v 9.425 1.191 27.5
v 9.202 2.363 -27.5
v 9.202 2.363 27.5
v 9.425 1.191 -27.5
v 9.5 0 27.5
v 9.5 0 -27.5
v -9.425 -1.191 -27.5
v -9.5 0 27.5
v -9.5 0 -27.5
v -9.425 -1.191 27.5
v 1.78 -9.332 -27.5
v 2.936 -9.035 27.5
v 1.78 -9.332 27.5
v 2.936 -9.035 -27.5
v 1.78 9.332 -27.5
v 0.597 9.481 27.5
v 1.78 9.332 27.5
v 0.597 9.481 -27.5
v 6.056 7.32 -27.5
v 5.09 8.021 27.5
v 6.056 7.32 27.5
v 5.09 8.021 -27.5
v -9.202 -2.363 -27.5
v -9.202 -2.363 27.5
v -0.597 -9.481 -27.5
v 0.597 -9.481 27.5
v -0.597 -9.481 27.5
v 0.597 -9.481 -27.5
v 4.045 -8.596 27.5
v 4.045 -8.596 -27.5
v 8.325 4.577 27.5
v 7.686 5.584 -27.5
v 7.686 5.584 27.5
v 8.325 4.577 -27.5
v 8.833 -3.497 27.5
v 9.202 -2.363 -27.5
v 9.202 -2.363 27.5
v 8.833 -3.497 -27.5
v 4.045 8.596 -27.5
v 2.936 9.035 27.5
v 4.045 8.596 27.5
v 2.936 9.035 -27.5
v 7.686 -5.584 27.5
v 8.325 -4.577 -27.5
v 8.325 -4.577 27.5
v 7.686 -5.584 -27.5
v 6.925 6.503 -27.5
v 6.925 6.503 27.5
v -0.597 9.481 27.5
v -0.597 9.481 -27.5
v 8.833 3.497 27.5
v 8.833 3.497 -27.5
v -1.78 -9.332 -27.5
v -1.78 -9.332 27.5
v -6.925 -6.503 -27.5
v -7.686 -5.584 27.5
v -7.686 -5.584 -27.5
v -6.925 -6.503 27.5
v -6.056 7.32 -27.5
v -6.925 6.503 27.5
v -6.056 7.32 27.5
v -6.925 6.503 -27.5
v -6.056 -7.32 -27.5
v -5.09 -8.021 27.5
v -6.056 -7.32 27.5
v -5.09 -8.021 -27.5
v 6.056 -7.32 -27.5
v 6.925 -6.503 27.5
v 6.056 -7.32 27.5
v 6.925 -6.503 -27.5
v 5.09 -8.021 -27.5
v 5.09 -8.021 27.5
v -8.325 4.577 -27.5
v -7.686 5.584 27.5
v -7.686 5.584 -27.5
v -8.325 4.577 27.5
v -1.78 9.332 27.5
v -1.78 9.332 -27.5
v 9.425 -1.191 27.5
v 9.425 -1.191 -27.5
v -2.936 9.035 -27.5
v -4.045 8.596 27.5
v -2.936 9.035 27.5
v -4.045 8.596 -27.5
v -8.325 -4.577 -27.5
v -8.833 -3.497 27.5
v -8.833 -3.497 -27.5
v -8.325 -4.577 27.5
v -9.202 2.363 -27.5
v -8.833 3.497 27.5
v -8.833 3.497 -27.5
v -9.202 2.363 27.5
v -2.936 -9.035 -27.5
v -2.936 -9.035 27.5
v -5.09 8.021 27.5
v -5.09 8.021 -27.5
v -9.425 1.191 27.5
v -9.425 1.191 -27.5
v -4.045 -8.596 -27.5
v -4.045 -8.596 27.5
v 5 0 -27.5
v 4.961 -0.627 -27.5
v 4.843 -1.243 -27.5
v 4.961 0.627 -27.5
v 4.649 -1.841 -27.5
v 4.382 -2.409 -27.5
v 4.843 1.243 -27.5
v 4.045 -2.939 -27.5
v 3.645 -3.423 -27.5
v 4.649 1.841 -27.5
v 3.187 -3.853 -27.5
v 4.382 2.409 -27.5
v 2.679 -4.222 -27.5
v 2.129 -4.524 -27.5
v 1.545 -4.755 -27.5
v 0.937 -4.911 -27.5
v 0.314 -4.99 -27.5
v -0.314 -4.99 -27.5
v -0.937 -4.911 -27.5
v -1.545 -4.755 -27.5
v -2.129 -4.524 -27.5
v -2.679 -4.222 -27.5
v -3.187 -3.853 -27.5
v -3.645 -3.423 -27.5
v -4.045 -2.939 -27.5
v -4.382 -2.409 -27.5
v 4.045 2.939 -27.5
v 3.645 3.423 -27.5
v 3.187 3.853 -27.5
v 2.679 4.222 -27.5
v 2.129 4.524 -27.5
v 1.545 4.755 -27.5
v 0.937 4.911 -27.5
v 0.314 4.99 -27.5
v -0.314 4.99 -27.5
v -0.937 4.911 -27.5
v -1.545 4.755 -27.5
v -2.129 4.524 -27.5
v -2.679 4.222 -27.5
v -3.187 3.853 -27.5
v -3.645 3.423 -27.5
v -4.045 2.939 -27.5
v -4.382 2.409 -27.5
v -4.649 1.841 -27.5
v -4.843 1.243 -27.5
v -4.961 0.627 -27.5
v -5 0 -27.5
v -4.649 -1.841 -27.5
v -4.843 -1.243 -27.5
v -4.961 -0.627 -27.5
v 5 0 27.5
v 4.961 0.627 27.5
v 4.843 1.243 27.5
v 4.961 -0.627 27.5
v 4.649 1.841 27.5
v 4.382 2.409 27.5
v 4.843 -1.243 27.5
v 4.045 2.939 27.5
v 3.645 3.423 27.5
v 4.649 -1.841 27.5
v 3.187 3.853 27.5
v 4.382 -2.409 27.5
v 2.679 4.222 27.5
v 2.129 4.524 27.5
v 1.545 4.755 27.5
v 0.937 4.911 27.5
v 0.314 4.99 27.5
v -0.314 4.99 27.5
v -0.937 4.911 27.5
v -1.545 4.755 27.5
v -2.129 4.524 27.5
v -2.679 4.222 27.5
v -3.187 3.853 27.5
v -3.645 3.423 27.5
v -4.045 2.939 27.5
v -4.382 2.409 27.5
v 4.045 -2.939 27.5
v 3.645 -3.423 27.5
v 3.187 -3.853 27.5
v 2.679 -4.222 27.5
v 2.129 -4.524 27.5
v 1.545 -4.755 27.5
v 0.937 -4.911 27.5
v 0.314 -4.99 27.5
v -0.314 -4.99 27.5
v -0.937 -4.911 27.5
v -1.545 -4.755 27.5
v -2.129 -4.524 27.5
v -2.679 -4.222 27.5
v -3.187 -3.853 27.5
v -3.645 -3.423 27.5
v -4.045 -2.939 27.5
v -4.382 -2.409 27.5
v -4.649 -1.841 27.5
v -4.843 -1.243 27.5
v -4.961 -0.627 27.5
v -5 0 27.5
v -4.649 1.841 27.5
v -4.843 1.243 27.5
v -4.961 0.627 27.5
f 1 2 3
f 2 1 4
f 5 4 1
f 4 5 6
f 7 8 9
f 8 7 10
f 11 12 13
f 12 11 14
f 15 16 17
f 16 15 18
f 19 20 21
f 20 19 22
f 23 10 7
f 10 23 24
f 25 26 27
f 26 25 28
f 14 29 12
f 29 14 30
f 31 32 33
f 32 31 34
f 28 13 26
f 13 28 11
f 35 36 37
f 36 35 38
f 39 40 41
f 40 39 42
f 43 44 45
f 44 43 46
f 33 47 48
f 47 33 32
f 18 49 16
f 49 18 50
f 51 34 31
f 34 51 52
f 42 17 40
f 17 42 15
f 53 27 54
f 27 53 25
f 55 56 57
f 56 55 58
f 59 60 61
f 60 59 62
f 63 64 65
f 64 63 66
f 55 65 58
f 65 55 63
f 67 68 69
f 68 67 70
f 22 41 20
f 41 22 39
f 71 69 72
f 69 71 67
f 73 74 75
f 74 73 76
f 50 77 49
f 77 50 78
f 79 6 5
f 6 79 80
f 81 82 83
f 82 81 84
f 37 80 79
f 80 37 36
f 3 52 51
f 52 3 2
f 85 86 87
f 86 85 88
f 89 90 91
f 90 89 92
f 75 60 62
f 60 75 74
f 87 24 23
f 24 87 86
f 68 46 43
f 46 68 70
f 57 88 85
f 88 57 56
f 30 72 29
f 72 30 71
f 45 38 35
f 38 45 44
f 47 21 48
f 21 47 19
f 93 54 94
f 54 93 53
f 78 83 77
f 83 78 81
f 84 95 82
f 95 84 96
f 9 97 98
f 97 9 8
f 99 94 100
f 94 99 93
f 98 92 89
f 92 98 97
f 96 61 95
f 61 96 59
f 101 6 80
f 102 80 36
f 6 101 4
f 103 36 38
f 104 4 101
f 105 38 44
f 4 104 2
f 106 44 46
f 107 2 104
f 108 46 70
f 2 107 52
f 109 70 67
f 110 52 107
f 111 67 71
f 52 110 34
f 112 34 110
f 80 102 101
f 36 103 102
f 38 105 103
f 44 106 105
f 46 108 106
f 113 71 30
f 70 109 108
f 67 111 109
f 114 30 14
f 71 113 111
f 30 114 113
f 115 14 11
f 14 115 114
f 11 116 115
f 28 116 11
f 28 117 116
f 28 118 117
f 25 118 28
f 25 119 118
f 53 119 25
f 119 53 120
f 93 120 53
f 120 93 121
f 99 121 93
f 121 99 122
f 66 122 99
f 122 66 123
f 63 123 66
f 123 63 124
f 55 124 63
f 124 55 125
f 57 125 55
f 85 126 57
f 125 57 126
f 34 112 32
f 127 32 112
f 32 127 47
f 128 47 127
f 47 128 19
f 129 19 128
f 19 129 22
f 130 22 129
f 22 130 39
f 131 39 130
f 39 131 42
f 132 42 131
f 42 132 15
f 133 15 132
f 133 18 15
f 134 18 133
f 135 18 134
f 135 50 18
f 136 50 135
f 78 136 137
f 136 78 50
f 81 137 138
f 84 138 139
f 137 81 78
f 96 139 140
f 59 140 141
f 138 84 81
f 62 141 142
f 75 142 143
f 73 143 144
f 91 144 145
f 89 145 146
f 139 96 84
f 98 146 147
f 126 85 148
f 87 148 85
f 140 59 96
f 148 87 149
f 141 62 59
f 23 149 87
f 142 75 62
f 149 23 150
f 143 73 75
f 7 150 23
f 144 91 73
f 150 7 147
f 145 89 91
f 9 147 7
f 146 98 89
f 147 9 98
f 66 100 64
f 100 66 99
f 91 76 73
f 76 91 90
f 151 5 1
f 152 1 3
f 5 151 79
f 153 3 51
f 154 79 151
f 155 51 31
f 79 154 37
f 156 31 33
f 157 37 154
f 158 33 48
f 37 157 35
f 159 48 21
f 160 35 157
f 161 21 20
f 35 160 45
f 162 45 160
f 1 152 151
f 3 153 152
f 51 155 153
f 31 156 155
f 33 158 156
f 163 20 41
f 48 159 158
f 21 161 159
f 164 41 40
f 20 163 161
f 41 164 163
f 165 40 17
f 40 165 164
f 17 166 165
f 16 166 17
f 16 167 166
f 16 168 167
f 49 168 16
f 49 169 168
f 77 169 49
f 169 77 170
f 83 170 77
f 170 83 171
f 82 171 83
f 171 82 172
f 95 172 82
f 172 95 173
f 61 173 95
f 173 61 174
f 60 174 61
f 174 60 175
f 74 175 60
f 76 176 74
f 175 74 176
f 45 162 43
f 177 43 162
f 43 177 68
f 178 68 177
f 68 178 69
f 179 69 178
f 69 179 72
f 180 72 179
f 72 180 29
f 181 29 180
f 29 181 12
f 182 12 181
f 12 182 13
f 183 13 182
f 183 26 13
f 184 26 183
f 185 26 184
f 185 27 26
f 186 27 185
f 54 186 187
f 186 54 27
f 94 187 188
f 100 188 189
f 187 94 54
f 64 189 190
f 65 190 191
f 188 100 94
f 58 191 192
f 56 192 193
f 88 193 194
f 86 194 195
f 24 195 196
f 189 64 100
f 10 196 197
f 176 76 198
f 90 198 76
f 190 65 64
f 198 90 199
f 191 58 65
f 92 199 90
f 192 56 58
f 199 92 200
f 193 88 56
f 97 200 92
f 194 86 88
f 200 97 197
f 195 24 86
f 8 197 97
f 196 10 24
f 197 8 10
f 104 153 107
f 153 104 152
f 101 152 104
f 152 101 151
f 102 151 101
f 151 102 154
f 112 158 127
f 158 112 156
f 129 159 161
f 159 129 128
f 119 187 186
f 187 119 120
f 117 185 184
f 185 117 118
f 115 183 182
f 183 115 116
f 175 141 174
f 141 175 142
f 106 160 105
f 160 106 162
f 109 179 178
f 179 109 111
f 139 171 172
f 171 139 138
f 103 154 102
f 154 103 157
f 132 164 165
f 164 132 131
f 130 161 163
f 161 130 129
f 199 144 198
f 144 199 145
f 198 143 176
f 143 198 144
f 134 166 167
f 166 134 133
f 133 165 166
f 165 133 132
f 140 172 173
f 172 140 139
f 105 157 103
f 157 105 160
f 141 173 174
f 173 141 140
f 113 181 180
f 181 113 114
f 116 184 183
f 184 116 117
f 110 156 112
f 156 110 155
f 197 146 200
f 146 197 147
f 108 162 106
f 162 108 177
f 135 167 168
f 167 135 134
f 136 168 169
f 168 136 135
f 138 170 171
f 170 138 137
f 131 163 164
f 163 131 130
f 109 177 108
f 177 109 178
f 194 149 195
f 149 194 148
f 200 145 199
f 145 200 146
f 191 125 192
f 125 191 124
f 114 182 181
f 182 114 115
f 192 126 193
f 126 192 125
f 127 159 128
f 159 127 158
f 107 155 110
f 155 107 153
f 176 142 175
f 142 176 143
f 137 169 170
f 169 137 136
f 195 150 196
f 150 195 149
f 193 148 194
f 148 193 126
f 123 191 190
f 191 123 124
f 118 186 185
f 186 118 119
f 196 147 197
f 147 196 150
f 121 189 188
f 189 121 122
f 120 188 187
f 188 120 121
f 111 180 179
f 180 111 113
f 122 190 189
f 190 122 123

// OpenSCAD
$fn = 50;


difference() {
	union() {
		translate(v = [0, 0, -27.5000000000]) {
			cylinder(h = 55, r = 9.5000000000);
		}
	}
	union() {
		translate(v = [0, 0, -100.0000000000]) {
			cylinder(h = 200, r = 5.0000000000);
		}
	}
}
